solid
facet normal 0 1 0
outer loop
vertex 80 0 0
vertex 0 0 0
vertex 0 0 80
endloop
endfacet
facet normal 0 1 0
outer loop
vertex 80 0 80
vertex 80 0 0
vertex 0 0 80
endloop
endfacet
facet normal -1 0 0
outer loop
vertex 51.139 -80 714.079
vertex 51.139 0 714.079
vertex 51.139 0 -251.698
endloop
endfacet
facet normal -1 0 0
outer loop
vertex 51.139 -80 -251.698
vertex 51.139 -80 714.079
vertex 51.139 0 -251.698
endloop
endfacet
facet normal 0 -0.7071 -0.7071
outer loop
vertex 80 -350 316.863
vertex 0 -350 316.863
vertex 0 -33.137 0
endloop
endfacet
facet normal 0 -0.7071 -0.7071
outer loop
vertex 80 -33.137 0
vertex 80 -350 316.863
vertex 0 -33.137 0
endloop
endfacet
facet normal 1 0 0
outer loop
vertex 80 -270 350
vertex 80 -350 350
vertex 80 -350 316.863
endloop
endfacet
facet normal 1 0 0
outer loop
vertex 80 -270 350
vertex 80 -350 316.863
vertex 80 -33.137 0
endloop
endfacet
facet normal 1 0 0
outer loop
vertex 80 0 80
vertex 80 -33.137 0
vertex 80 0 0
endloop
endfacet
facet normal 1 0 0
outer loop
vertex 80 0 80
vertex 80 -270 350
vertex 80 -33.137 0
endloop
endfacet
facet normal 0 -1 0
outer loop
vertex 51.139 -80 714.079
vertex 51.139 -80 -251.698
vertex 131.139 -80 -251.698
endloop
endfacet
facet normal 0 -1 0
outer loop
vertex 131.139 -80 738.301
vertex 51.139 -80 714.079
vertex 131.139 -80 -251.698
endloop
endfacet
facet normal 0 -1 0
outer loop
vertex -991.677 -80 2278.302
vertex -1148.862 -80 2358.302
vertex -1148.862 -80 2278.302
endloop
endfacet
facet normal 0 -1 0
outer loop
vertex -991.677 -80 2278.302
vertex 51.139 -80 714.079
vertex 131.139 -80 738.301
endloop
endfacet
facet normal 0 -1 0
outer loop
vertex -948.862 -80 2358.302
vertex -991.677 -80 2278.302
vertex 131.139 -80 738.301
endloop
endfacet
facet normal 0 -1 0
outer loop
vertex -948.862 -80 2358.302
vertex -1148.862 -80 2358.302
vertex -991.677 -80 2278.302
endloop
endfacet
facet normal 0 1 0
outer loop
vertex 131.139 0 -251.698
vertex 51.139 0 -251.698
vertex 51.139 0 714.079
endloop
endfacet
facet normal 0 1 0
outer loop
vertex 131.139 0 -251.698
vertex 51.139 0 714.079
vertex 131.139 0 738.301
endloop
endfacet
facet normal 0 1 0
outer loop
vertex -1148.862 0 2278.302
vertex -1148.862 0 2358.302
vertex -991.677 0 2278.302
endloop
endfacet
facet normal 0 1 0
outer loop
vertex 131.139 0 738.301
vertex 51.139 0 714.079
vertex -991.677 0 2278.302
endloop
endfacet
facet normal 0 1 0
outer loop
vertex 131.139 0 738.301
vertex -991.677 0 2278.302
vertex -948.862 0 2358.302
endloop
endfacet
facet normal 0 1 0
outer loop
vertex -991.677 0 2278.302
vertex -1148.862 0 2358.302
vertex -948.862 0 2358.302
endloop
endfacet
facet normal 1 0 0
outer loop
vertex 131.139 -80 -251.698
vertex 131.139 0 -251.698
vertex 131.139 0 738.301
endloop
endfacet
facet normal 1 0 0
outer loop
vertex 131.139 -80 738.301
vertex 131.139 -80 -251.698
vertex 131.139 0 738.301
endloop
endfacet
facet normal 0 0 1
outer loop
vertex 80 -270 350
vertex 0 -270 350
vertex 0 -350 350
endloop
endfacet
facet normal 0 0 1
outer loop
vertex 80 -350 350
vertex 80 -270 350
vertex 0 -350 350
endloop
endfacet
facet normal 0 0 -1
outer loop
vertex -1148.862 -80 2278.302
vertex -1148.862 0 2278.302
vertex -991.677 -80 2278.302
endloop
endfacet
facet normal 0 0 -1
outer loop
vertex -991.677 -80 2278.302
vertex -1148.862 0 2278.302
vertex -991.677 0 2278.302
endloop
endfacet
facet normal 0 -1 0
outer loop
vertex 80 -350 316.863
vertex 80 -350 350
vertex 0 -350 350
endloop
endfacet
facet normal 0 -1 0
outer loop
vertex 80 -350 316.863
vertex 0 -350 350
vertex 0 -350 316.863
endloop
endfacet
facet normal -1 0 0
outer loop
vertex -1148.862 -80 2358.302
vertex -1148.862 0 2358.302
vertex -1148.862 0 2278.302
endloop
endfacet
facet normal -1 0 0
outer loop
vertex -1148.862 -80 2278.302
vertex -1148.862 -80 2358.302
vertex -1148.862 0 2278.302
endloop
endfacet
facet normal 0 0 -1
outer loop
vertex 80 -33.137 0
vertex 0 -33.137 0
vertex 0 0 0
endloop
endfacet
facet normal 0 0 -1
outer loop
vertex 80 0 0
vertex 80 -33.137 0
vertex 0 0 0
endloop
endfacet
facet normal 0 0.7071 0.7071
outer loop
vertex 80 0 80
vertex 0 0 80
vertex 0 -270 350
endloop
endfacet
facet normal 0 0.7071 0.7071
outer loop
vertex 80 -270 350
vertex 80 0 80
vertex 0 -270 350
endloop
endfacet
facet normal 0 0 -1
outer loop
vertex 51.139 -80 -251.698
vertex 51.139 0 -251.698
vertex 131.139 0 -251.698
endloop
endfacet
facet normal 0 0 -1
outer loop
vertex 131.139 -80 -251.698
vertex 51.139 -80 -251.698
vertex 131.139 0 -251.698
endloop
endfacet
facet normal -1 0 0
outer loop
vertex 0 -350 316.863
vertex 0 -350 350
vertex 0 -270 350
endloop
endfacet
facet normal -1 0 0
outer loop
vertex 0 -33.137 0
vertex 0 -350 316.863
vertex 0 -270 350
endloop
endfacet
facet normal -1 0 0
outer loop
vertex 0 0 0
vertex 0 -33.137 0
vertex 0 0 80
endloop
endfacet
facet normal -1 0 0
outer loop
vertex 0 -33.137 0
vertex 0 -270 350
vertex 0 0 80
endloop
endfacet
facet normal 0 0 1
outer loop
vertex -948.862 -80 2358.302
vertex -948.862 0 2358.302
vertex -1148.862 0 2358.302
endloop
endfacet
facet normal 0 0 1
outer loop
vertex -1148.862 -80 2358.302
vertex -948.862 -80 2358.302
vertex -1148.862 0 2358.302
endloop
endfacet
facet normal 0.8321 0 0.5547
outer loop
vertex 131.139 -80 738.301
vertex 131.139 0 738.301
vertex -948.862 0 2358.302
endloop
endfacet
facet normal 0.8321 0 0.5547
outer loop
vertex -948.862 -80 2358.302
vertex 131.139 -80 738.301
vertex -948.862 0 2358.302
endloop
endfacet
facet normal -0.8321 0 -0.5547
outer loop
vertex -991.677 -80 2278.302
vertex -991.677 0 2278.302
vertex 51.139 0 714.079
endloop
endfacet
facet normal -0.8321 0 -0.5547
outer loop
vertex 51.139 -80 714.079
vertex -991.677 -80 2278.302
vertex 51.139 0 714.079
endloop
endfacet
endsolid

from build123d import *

# Parameters (mm, degrees)
F1_DEPTH = 80
F3_DEPTH = 80


with BuildPart() as f1:
    # F0 (on Right) → F1 (new body)
    with BuildSketch(Plane.YZ):
        Polygon((-33.137191, 0), (0, 0), (0, 79.999894), (-270.000041, 349.999934), (-349.999994, 349.999934), (-349.999994, 316.862803), align=None)
    extrude(amount=F1_DEPTH)


with BuildPart() as f3:
    # F2 (on Front) → F3 (new body)
    with BuildSketch(Plane.XZ):
        Polygon((-1148.861766, 2278.30151), (-991.676582, 2278.30151), (51.138578, 714.078768), (51.138578, -251.6983), (131.138578, -251.6983), (131.138578, 738.300819), (-948.861881, 2358.30151), (-1148.861766, 2358.30151), align=None)
    extrude(amount=F3_DEPTH)


solid = Compound([f1.part, f3.part])
